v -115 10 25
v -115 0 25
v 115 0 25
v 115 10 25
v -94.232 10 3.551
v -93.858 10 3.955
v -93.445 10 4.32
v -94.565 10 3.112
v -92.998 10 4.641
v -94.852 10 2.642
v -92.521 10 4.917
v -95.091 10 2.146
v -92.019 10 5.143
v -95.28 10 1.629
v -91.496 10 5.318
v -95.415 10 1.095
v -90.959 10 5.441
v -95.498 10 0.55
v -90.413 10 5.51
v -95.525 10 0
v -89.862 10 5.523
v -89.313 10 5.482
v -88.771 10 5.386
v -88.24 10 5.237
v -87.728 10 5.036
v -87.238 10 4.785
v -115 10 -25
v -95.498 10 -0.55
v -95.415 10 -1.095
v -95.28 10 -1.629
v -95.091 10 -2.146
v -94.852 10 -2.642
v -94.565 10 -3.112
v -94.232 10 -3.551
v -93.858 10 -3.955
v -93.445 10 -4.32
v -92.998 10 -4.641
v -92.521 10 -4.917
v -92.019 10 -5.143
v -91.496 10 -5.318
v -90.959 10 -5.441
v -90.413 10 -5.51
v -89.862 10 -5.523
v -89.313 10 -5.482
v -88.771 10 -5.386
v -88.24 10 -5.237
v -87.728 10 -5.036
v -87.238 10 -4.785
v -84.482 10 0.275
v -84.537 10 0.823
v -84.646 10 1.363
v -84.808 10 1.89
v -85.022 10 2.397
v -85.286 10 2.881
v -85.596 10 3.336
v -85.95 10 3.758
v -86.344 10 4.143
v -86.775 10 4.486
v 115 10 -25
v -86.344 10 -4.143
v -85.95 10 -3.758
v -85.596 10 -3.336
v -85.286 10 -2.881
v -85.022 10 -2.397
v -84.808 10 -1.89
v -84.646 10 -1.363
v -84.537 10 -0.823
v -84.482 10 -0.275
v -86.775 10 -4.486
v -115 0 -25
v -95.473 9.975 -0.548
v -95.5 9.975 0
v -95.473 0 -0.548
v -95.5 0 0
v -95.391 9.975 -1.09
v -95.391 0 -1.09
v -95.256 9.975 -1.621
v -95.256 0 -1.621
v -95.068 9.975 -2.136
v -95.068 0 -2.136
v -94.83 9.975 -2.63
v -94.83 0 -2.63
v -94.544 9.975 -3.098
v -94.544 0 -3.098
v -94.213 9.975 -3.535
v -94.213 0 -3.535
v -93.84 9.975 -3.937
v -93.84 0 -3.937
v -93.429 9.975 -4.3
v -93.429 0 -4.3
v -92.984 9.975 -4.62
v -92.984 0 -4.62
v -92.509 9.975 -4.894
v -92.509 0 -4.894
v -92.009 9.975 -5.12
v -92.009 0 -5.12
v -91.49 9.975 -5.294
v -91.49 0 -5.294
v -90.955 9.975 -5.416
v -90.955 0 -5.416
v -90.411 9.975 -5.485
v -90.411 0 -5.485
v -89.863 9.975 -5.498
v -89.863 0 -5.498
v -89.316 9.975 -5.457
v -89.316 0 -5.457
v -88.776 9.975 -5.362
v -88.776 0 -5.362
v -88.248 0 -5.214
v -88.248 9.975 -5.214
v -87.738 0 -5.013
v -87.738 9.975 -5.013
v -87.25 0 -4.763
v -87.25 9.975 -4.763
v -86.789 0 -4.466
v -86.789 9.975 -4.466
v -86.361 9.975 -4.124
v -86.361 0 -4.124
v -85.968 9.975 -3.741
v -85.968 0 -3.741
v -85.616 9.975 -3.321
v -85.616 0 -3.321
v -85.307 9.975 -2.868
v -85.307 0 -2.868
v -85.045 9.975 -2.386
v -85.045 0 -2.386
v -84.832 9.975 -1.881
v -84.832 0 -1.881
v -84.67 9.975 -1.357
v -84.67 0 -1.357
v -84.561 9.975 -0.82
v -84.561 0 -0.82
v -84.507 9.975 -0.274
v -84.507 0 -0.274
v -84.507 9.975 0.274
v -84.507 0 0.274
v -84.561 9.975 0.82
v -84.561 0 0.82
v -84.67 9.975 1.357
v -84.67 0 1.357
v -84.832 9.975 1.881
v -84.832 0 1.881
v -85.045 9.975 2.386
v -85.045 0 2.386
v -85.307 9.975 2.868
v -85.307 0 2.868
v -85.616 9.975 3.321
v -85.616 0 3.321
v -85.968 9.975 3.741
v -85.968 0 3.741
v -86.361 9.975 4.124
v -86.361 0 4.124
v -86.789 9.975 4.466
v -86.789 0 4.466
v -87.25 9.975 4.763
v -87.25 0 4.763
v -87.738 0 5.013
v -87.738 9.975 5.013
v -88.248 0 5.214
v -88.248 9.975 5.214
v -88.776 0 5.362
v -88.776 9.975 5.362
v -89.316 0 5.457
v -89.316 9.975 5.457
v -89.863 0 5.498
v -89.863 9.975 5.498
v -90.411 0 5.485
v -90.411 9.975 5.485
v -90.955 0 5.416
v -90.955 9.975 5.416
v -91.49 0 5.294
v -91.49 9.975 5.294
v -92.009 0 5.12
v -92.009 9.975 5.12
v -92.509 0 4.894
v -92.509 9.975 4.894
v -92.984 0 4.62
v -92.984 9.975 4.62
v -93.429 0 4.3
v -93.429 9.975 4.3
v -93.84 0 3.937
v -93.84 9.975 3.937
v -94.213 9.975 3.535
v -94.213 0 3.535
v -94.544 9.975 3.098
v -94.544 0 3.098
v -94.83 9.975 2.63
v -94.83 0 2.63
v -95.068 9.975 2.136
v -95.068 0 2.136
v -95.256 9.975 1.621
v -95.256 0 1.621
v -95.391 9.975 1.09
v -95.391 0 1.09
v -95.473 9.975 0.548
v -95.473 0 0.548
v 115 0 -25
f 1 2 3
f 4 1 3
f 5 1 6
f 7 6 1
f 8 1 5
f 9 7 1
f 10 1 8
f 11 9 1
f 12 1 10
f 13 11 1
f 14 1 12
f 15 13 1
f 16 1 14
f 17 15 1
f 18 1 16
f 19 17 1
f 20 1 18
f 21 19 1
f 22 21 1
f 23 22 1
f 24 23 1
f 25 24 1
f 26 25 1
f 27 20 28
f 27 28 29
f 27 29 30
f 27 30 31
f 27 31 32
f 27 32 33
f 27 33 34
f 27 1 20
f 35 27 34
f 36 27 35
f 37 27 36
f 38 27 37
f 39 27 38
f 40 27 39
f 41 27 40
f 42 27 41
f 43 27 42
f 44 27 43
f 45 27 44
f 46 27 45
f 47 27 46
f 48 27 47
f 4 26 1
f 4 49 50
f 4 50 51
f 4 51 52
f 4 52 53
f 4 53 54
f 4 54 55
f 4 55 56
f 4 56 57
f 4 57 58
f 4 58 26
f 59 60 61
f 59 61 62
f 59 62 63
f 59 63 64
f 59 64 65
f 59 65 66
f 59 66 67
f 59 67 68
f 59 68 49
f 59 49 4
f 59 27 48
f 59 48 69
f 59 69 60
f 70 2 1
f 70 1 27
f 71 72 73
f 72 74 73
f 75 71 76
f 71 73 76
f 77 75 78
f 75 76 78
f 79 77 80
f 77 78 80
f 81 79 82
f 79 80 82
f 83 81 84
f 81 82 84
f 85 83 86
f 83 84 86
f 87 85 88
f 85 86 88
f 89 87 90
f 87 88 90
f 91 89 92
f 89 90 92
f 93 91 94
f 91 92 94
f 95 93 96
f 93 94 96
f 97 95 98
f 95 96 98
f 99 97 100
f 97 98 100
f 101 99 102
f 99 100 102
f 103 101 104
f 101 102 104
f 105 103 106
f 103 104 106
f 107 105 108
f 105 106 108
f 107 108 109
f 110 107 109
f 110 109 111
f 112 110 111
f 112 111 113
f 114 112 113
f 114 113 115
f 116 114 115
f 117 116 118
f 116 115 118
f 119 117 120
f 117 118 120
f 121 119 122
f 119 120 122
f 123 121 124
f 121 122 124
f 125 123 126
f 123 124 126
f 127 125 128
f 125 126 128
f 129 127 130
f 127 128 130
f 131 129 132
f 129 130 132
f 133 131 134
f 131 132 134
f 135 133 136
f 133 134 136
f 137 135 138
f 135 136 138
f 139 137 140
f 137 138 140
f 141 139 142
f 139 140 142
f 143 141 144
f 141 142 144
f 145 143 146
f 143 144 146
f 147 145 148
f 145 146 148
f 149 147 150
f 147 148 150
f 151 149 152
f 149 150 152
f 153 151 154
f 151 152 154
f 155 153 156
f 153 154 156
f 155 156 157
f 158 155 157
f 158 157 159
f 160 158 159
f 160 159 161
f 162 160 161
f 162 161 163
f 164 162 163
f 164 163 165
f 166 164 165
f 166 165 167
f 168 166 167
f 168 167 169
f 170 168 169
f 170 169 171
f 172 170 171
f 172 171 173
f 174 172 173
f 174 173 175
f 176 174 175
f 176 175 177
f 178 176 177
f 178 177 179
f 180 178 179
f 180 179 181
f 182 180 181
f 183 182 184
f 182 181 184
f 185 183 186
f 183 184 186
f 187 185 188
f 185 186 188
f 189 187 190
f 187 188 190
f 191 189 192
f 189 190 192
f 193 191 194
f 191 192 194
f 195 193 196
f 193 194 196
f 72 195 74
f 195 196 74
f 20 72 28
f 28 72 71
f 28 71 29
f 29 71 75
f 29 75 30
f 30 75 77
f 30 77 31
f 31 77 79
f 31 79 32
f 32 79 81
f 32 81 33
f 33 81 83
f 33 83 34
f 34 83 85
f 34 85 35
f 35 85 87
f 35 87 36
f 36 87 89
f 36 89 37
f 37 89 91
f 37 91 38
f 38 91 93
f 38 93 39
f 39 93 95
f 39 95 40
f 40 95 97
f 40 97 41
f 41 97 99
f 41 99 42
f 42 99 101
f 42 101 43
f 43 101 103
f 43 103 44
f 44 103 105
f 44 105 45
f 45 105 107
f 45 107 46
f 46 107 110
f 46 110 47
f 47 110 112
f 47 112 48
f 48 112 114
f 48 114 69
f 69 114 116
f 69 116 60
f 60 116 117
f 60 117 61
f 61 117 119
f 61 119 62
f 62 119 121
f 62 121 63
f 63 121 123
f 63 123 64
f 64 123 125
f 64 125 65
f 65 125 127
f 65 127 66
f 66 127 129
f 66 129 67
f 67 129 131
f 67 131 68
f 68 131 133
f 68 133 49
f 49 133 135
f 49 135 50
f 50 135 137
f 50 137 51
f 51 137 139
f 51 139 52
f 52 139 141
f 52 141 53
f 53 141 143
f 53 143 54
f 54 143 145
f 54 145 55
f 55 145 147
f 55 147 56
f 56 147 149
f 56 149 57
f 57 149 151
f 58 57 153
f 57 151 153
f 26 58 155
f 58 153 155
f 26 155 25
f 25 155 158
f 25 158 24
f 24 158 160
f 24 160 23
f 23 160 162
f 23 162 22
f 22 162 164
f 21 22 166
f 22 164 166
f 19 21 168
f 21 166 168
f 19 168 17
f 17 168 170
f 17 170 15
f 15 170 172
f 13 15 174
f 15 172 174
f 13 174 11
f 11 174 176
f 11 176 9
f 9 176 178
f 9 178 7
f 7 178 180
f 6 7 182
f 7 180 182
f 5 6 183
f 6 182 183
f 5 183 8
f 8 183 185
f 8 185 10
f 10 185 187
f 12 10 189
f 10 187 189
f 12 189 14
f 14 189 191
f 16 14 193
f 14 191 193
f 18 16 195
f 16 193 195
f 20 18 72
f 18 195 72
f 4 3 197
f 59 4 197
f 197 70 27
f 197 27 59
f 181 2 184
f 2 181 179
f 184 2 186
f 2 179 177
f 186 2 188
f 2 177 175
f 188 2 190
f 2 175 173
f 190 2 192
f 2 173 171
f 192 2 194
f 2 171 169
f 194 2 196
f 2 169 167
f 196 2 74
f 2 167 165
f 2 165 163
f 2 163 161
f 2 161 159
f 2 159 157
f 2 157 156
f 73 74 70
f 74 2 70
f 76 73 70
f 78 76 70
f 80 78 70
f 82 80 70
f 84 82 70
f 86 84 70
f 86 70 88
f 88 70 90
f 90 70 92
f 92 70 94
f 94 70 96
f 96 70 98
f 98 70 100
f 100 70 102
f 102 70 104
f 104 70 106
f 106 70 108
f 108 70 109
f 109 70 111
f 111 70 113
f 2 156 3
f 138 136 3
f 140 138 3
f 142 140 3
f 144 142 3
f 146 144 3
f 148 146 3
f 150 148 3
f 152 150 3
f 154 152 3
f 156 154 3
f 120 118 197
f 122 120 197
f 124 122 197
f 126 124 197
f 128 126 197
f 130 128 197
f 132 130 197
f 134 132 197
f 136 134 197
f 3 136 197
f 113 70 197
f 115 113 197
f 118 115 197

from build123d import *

# Parameters (mm, degrees)
SKETCH1_W                       = 230
SKETCH1_H                       = 50
BOSS_EXTRUDE1_DEPTH             = 10
M10_CLEARANCE_HOLE1_D           = 11
M10_CLEARANCE_HOLE1_CSINK_D     = 11.05
M10_CLEARANCE_HOLE1_CSINK_ANGLE = 90


with BuildPart() as part:
    # Sketch1 → Boss-Extrude1 (new body)
    with BuildSketch(Plane(origin=(0, 0, 0), x_dir=(1, 0, 0), z_dir=(0, 1, 0))):
        Rectangle(SKETCH1_W, SKETCH1_H)
    extrude(amount=BOSS_EXTRUDE1_DEPTH)

    # M10 Clearance Hole1 (through all)
    with Locations(Plane(origin=(0, 10, 0), x_dir=(1, 0, 0), z_dir=(0, 1, 0))):
        with Locations((-90, 0)):
            CounterSinkHole(M10_CLEARANCE_HOLE1_D / 2, M10_CLEARANCE_HOLE1_CSINK_D / 2, counter_sink_angle=M10_CLEARANCE_HOLE1_CSINK_ANGLE)


solid = part.part
